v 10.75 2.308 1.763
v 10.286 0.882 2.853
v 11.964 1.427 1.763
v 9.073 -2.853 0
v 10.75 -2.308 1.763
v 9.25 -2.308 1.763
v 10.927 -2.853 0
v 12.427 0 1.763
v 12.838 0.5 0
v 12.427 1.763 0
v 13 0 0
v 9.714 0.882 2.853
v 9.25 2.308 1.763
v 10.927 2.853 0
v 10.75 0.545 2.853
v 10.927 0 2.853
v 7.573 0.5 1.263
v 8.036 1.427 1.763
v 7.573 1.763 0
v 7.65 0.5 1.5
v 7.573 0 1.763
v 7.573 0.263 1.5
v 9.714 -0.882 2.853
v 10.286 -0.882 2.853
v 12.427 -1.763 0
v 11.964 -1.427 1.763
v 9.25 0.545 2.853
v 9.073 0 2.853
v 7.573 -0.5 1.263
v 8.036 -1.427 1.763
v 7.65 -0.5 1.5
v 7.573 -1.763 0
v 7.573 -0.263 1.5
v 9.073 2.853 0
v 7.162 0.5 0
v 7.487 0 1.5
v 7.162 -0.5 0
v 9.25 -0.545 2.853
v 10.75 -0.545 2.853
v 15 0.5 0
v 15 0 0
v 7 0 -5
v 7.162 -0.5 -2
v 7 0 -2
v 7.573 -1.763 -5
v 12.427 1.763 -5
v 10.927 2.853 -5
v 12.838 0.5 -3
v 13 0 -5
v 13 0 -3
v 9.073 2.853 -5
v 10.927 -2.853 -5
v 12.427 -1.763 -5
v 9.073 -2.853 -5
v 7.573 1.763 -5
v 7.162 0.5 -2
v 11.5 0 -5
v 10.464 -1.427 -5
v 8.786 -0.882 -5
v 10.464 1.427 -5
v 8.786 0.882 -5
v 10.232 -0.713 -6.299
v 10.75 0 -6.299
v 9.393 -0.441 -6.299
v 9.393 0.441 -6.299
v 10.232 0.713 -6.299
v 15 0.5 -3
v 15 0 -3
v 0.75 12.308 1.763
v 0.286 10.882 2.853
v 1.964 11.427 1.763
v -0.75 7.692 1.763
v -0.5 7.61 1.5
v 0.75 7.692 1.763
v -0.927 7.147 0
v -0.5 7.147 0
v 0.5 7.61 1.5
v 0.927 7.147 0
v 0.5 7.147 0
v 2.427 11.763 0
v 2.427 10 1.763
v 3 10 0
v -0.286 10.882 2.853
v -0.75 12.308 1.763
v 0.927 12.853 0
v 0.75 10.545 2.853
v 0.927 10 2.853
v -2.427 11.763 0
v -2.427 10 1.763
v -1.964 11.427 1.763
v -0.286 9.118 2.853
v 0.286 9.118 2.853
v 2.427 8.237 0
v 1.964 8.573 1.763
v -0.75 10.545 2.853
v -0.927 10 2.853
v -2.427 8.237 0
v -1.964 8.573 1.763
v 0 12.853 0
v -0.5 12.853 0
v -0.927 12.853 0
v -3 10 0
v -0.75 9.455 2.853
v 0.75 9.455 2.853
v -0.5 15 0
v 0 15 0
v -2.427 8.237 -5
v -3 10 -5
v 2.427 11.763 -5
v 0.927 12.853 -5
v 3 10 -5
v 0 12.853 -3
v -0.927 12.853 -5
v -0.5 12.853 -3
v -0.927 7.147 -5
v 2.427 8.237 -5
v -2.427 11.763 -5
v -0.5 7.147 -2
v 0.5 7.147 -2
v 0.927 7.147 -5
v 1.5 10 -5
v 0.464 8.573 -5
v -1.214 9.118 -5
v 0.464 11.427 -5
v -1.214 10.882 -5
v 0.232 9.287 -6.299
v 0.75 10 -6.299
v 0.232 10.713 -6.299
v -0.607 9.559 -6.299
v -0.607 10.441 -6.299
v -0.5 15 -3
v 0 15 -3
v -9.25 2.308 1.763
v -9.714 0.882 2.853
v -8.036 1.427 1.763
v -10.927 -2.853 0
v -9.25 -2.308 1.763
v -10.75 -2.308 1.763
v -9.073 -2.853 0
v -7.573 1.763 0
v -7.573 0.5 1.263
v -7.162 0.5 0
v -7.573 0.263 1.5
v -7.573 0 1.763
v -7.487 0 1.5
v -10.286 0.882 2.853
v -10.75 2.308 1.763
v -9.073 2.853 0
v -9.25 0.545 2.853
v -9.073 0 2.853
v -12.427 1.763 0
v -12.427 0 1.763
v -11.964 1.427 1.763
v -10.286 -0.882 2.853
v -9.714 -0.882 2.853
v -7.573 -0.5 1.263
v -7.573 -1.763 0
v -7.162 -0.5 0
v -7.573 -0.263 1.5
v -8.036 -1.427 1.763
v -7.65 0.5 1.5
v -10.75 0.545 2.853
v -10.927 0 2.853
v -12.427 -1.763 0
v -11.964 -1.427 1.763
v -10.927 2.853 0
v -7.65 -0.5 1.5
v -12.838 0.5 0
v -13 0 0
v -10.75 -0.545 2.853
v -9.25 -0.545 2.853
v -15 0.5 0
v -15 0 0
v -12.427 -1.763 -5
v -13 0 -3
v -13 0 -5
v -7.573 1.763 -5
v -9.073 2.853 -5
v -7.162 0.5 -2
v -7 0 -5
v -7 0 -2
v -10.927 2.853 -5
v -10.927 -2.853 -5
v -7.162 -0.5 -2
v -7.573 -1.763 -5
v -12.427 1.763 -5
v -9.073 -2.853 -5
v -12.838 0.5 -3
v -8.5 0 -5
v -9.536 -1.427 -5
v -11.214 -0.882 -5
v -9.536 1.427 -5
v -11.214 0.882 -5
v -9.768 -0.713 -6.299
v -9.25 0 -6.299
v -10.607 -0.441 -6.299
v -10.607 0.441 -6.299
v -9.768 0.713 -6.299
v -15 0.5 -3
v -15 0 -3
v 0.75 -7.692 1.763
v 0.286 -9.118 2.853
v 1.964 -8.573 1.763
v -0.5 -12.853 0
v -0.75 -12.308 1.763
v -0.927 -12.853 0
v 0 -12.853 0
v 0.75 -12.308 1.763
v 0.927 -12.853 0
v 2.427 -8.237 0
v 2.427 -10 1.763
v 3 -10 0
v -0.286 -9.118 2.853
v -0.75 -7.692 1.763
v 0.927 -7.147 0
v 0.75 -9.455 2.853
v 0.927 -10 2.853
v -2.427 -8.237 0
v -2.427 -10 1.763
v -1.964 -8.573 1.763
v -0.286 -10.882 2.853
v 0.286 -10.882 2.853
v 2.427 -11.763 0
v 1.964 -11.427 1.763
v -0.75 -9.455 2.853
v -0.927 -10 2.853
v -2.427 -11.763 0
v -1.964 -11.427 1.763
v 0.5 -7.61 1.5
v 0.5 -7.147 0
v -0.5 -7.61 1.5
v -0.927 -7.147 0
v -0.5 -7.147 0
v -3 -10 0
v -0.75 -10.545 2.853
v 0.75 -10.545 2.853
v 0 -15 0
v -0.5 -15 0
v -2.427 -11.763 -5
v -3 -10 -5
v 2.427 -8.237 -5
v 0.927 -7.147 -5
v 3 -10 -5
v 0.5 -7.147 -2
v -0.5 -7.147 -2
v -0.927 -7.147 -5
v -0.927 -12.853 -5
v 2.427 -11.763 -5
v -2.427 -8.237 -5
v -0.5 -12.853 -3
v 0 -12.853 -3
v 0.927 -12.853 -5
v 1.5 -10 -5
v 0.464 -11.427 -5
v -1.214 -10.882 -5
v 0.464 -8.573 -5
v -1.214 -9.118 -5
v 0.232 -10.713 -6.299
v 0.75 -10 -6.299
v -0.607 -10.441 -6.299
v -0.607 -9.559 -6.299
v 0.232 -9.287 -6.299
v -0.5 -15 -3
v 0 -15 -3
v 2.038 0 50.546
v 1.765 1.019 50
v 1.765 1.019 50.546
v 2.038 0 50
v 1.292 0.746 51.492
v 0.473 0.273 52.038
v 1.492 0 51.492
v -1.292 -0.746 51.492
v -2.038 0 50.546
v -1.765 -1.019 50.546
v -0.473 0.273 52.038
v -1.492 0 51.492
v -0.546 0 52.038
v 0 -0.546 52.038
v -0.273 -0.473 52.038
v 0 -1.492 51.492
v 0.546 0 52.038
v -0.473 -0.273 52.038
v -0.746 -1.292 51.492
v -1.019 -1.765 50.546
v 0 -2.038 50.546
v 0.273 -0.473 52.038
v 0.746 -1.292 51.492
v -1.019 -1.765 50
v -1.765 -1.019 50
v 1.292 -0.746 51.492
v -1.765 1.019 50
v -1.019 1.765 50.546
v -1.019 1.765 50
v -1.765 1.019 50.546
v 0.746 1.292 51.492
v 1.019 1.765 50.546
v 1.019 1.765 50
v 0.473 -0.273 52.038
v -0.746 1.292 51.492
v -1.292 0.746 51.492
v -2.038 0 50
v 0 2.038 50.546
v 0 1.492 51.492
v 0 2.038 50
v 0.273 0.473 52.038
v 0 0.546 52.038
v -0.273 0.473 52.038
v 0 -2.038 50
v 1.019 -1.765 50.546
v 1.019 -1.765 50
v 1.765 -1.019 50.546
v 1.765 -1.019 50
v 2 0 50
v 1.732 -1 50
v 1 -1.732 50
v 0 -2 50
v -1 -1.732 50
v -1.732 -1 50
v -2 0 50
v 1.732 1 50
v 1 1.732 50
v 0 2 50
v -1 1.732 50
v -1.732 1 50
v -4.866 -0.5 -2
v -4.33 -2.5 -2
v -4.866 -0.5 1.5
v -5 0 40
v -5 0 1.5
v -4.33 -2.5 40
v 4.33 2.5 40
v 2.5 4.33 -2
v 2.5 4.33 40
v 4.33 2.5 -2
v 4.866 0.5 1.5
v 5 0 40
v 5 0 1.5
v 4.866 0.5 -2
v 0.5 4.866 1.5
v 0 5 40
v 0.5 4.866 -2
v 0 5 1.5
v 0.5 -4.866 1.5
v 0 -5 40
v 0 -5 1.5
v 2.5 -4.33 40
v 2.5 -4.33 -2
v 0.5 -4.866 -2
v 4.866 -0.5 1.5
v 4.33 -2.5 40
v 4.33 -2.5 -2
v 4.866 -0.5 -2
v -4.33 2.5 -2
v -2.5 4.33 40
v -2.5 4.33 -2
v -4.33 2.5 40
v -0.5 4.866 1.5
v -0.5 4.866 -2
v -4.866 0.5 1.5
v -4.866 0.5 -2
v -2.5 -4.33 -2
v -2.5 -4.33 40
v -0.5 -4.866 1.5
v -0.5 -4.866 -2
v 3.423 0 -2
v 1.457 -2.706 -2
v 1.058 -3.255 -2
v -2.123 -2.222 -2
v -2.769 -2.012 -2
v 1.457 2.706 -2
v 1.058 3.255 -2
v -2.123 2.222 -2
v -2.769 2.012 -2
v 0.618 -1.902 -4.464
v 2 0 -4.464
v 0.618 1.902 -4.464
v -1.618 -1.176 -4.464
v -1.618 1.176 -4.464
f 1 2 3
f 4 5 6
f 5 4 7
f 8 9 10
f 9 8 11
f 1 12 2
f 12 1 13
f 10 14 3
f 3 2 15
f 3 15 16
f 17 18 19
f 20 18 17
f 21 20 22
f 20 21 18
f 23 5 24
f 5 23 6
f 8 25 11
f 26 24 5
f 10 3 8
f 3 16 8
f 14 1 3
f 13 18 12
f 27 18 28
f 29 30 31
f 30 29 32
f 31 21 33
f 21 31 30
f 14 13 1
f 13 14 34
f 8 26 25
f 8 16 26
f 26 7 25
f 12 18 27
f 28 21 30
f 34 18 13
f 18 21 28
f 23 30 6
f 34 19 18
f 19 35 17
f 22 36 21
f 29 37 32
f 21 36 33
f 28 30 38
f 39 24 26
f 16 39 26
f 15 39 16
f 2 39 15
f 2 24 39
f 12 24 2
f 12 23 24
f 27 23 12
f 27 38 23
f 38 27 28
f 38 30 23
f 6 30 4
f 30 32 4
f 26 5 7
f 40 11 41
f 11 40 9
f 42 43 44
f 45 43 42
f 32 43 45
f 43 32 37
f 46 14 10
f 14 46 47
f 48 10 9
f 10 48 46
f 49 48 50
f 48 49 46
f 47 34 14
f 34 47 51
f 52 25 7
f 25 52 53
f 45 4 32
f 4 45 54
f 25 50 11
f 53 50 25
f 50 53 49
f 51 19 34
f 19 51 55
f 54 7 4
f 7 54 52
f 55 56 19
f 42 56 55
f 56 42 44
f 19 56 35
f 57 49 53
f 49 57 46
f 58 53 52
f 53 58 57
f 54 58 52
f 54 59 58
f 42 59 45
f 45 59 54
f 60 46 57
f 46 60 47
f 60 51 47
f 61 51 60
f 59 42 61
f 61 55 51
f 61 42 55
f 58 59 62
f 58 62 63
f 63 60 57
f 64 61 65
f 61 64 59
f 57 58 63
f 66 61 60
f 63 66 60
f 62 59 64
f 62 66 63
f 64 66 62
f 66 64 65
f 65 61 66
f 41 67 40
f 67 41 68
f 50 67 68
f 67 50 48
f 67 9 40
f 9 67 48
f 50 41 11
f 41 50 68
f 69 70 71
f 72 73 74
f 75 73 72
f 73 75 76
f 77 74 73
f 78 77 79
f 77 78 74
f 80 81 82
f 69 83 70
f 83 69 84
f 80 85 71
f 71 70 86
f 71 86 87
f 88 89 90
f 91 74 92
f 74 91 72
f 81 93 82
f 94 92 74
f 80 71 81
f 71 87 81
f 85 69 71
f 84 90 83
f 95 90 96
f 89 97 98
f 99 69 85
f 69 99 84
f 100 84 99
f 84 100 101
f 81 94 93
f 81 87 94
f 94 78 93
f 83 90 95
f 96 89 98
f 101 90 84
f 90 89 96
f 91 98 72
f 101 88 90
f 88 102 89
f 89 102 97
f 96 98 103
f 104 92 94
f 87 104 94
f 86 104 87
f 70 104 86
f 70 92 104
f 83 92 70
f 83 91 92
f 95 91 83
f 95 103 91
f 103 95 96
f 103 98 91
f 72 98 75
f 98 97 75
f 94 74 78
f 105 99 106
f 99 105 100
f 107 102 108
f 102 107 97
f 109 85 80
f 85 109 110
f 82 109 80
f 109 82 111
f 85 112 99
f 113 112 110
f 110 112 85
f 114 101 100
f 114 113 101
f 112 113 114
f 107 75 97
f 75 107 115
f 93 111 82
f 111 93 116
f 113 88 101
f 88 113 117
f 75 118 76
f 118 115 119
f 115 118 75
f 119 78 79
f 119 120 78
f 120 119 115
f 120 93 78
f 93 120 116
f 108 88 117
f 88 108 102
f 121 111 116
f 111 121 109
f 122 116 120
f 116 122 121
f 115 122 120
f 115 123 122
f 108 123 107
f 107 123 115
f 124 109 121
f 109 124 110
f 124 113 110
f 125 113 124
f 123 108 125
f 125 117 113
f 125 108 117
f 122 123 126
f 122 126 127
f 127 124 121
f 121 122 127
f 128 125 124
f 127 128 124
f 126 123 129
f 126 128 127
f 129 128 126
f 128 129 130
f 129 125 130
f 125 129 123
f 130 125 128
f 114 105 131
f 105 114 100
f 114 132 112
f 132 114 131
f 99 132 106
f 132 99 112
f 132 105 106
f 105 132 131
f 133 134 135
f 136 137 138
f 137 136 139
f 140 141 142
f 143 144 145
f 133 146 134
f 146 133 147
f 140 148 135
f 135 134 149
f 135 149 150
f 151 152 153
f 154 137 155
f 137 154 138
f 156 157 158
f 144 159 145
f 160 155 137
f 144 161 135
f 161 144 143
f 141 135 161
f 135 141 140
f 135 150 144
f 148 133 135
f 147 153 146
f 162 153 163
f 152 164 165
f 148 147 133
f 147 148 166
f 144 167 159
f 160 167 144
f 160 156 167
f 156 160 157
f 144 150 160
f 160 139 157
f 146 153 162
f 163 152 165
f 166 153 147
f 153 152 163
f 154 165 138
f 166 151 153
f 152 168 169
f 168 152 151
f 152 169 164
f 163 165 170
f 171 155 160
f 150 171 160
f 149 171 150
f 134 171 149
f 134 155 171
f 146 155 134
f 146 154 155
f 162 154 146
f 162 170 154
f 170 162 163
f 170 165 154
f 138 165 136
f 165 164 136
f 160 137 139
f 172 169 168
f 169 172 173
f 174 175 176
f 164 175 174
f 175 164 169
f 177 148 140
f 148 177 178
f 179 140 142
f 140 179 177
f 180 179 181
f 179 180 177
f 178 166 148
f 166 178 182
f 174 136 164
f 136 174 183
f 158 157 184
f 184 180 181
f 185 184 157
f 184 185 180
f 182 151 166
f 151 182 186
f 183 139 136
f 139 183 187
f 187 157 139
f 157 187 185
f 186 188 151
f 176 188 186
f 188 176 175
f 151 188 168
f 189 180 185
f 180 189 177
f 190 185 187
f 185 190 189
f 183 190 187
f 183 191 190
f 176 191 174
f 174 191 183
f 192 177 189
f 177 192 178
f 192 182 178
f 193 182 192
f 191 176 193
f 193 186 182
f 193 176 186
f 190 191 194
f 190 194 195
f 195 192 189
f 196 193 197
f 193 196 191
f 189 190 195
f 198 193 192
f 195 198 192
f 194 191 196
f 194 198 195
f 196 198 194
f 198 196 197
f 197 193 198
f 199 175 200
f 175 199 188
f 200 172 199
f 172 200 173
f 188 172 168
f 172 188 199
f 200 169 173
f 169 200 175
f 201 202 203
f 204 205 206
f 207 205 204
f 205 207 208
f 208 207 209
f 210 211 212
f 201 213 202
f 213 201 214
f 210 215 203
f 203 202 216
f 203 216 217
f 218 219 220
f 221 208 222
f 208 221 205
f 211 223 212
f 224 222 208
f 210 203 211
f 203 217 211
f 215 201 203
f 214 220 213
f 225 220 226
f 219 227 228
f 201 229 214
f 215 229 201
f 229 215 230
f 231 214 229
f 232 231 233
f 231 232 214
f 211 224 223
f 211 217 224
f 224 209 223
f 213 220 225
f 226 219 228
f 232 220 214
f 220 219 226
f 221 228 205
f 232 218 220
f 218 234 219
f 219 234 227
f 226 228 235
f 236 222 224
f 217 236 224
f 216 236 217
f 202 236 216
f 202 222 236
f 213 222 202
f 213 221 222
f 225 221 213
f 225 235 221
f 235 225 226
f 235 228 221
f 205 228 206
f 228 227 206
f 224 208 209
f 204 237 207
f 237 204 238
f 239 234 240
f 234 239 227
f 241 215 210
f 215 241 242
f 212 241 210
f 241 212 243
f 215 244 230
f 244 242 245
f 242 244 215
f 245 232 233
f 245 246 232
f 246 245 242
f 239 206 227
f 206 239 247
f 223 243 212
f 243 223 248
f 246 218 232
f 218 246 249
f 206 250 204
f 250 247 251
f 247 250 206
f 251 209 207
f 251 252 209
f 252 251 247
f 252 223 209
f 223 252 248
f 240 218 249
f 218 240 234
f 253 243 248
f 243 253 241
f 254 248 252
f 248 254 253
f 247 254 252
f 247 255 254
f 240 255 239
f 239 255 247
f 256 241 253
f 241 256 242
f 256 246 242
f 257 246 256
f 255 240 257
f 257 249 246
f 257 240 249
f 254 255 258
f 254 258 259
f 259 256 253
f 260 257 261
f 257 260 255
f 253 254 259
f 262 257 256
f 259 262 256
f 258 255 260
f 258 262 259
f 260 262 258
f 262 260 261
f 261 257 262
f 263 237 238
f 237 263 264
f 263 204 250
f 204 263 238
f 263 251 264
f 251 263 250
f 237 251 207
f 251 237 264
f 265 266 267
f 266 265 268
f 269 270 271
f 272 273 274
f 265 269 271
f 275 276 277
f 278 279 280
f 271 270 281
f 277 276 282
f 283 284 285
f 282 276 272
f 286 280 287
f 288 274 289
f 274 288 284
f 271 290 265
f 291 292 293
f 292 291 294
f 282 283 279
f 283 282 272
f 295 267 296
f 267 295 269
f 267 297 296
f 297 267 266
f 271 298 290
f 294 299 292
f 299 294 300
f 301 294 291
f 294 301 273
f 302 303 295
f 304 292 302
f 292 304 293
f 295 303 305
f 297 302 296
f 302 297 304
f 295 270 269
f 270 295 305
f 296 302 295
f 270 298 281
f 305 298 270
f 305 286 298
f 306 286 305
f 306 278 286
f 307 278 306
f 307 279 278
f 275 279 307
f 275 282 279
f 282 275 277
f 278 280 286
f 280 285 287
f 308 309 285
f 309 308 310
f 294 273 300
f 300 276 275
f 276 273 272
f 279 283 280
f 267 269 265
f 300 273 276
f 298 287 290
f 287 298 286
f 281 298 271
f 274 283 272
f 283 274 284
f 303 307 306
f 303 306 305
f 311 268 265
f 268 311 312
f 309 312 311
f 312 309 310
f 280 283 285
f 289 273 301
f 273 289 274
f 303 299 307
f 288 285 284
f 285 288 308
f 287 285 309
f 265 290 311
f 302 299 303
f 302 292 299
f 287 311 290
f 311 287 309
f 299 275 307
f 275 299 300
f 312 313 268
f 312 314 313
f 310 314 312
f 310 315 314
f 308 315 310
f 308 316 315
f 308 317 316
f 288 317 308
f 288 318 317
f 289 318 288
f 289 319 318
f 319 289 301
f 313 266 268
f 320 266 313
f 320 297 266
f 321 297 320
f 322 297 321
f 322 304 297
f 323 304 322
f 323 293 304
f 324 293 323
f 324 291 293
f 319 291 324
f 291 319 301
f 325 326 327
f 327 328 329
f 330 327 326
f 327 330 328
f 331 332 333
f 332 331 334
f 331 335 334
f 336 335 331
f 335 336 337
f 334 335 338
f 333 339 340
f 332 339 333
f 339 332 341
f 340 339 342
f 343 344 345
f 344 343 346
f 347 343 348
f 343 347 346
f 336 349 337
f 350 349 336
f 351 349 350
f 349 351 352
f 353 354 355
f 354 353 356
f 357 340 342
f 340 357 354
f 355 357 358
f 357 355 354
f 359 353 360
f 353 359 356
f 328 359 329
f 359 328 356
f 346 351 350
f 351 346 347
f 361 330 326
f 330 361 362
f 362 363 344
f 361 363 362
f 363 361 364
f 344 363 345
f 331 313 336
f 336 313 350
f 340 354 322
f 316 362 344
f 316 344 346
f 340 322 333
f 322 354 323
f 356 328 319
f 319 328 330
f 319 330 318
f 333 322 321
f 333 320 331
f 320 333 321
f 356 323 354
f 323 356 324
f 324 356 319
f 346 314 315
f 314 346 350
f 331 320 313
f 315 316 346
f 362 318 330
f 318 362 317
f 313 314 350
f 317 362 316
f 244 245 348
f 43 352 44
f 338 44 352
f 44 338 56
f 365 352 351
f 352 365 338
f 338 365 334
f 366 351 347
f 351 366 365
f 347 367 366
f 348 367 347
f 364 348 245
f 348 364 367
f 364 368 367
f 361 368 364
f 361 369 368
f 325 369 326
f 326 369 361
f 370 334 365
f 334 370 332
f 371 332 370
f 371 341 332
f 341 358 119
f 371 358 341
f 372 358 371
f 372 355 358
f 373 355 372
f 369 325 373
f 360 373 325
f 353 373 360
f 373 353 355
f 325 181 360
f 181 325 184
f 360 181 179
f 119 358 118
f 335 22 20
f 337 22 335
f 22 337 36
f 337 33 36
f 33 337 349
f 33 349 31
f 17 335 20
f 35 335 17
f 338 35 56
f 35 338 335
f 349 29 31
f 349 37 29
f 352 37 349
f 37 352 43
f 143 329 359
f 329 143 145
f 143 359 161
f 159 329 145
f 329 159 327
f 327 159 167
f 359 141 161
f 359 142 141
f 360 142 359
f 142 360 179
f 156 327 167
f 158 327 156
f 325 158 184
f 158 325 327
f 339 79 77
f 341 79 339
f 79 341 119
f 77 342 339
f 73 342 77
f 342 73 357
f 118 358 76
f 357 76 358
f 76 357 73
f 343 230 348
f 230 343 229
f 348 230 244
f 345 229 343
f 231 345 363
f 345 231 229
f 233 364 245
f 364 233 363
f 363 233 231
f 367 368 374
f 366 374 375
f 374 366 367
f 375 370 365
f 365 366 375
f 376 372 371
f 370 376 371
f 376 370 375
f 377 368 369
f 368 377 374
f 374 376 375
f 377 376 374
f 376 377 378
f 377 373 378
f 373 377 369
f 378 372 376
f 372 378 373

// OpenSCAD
union(){
    translate([0,0,20])
        color("black")
        cylinder(r = 5, $fn = 12, h = 20);
    translate([0,0,40])
        color("magenta")
        cylinder(r1 = 5, r2 = 2, $fn = 12, h = 10);
    translate([0,0, -2])
        color("black")
        cylinder(r = 5, $fn = 12, h = 21);
    translate([4.8, -0.5, -2])
        color("pink")
        cube([6,1,3.5]);
    translate([10, 0, 0]){
        union(){
            difference(){  
                color("pink")
                sphere(r = 3);
                translate([0, 0, -5])
                    cube(10, center=true);
            };
            translate([0, 0, -5])
                color("black")
                cylinder(r = 3, h = 5);
                translate([0,0, -5])
                    color("darkorange")
                    sphere(r = 1.5);
                translate([2, 0, -3])
                    color("magenta")
                    cube([3, 0.5, 3]);
         }
}
    
    translate([-8, -0.5, -2])
        color("pink")
        cube([3.2,1, 3.5]);
    translate([0, 10, 0]){
        union(){
            difference(){ 
                color("pink")
                sphere(r = 3);
                translate([0, 0, -5])
                    cube(10, center=true);
            };
            translate([0, 0, -5])
                color("black")
                cylinder(r = 3, h = 5);
                translate([0,0, -5])
                    color("darkorange")
                    sphere(r = 1.5);
                translate([0, 2, -3])
                    rotate([0,0,90])
                    color("magenta")
                    cube([3, 0.5, 3]);
        }
}
    translate([-0.5, 4.8, -2])
        color("pink")
        cube([1,6, 3.5]);
    translate([-10, 0, 0]){
        union(){
            difference(){ 
                color("pink")
                sphere(r = 3);
                translate([0, 0, -5])
                    cube(10, center=true);
            };
            translate([0, 0, -5])
                color("black")
                cylinder(r = 3, h = 5);
                translate([0,0, -5])
                    color("darkorange")
                    sphere(r = 1.5);
                translate([-5, 0, -3])
                    color("magenta")
                    cube([3, 0.5, 3]);
        }
}
    translate([-0.5, -8, -2])
        color("pink")
        cube([1,3.2, 3.5]);
    translate([0, -10, 0]){
        union(){
            difference(){
                color("pink")
                sphere(r = 3);
                translate([0, 0, -5])
                    cube(10, center=true);
            };
            translate([0, 0, -5])
                color("black")
                cylinder(r = 3, h = 5);
                translate([0,0, -5])
                    color("darkorange")
                    sphere(r = 1.5);
                translate([0, -5, -3])
                    rotate([0, 0, 90])
                    color("magenta")
                    cube([3, 0.5, 3]);
        }
}
    translate([0, 0, 19])
        color("pink")
        cylinder(r = 5, $fn = 12, h =1);
    translate([0,0, -1])
        color("darkorange")
        sphere(r = 4, $fn = 5);
    translate([0, 0, 50])
        difference(){
        color("pink")  
        sphere(r = 2.11, $fn = 12);
        translate([0, 0, -5])
            cube(10, center=true);           

    };
};
